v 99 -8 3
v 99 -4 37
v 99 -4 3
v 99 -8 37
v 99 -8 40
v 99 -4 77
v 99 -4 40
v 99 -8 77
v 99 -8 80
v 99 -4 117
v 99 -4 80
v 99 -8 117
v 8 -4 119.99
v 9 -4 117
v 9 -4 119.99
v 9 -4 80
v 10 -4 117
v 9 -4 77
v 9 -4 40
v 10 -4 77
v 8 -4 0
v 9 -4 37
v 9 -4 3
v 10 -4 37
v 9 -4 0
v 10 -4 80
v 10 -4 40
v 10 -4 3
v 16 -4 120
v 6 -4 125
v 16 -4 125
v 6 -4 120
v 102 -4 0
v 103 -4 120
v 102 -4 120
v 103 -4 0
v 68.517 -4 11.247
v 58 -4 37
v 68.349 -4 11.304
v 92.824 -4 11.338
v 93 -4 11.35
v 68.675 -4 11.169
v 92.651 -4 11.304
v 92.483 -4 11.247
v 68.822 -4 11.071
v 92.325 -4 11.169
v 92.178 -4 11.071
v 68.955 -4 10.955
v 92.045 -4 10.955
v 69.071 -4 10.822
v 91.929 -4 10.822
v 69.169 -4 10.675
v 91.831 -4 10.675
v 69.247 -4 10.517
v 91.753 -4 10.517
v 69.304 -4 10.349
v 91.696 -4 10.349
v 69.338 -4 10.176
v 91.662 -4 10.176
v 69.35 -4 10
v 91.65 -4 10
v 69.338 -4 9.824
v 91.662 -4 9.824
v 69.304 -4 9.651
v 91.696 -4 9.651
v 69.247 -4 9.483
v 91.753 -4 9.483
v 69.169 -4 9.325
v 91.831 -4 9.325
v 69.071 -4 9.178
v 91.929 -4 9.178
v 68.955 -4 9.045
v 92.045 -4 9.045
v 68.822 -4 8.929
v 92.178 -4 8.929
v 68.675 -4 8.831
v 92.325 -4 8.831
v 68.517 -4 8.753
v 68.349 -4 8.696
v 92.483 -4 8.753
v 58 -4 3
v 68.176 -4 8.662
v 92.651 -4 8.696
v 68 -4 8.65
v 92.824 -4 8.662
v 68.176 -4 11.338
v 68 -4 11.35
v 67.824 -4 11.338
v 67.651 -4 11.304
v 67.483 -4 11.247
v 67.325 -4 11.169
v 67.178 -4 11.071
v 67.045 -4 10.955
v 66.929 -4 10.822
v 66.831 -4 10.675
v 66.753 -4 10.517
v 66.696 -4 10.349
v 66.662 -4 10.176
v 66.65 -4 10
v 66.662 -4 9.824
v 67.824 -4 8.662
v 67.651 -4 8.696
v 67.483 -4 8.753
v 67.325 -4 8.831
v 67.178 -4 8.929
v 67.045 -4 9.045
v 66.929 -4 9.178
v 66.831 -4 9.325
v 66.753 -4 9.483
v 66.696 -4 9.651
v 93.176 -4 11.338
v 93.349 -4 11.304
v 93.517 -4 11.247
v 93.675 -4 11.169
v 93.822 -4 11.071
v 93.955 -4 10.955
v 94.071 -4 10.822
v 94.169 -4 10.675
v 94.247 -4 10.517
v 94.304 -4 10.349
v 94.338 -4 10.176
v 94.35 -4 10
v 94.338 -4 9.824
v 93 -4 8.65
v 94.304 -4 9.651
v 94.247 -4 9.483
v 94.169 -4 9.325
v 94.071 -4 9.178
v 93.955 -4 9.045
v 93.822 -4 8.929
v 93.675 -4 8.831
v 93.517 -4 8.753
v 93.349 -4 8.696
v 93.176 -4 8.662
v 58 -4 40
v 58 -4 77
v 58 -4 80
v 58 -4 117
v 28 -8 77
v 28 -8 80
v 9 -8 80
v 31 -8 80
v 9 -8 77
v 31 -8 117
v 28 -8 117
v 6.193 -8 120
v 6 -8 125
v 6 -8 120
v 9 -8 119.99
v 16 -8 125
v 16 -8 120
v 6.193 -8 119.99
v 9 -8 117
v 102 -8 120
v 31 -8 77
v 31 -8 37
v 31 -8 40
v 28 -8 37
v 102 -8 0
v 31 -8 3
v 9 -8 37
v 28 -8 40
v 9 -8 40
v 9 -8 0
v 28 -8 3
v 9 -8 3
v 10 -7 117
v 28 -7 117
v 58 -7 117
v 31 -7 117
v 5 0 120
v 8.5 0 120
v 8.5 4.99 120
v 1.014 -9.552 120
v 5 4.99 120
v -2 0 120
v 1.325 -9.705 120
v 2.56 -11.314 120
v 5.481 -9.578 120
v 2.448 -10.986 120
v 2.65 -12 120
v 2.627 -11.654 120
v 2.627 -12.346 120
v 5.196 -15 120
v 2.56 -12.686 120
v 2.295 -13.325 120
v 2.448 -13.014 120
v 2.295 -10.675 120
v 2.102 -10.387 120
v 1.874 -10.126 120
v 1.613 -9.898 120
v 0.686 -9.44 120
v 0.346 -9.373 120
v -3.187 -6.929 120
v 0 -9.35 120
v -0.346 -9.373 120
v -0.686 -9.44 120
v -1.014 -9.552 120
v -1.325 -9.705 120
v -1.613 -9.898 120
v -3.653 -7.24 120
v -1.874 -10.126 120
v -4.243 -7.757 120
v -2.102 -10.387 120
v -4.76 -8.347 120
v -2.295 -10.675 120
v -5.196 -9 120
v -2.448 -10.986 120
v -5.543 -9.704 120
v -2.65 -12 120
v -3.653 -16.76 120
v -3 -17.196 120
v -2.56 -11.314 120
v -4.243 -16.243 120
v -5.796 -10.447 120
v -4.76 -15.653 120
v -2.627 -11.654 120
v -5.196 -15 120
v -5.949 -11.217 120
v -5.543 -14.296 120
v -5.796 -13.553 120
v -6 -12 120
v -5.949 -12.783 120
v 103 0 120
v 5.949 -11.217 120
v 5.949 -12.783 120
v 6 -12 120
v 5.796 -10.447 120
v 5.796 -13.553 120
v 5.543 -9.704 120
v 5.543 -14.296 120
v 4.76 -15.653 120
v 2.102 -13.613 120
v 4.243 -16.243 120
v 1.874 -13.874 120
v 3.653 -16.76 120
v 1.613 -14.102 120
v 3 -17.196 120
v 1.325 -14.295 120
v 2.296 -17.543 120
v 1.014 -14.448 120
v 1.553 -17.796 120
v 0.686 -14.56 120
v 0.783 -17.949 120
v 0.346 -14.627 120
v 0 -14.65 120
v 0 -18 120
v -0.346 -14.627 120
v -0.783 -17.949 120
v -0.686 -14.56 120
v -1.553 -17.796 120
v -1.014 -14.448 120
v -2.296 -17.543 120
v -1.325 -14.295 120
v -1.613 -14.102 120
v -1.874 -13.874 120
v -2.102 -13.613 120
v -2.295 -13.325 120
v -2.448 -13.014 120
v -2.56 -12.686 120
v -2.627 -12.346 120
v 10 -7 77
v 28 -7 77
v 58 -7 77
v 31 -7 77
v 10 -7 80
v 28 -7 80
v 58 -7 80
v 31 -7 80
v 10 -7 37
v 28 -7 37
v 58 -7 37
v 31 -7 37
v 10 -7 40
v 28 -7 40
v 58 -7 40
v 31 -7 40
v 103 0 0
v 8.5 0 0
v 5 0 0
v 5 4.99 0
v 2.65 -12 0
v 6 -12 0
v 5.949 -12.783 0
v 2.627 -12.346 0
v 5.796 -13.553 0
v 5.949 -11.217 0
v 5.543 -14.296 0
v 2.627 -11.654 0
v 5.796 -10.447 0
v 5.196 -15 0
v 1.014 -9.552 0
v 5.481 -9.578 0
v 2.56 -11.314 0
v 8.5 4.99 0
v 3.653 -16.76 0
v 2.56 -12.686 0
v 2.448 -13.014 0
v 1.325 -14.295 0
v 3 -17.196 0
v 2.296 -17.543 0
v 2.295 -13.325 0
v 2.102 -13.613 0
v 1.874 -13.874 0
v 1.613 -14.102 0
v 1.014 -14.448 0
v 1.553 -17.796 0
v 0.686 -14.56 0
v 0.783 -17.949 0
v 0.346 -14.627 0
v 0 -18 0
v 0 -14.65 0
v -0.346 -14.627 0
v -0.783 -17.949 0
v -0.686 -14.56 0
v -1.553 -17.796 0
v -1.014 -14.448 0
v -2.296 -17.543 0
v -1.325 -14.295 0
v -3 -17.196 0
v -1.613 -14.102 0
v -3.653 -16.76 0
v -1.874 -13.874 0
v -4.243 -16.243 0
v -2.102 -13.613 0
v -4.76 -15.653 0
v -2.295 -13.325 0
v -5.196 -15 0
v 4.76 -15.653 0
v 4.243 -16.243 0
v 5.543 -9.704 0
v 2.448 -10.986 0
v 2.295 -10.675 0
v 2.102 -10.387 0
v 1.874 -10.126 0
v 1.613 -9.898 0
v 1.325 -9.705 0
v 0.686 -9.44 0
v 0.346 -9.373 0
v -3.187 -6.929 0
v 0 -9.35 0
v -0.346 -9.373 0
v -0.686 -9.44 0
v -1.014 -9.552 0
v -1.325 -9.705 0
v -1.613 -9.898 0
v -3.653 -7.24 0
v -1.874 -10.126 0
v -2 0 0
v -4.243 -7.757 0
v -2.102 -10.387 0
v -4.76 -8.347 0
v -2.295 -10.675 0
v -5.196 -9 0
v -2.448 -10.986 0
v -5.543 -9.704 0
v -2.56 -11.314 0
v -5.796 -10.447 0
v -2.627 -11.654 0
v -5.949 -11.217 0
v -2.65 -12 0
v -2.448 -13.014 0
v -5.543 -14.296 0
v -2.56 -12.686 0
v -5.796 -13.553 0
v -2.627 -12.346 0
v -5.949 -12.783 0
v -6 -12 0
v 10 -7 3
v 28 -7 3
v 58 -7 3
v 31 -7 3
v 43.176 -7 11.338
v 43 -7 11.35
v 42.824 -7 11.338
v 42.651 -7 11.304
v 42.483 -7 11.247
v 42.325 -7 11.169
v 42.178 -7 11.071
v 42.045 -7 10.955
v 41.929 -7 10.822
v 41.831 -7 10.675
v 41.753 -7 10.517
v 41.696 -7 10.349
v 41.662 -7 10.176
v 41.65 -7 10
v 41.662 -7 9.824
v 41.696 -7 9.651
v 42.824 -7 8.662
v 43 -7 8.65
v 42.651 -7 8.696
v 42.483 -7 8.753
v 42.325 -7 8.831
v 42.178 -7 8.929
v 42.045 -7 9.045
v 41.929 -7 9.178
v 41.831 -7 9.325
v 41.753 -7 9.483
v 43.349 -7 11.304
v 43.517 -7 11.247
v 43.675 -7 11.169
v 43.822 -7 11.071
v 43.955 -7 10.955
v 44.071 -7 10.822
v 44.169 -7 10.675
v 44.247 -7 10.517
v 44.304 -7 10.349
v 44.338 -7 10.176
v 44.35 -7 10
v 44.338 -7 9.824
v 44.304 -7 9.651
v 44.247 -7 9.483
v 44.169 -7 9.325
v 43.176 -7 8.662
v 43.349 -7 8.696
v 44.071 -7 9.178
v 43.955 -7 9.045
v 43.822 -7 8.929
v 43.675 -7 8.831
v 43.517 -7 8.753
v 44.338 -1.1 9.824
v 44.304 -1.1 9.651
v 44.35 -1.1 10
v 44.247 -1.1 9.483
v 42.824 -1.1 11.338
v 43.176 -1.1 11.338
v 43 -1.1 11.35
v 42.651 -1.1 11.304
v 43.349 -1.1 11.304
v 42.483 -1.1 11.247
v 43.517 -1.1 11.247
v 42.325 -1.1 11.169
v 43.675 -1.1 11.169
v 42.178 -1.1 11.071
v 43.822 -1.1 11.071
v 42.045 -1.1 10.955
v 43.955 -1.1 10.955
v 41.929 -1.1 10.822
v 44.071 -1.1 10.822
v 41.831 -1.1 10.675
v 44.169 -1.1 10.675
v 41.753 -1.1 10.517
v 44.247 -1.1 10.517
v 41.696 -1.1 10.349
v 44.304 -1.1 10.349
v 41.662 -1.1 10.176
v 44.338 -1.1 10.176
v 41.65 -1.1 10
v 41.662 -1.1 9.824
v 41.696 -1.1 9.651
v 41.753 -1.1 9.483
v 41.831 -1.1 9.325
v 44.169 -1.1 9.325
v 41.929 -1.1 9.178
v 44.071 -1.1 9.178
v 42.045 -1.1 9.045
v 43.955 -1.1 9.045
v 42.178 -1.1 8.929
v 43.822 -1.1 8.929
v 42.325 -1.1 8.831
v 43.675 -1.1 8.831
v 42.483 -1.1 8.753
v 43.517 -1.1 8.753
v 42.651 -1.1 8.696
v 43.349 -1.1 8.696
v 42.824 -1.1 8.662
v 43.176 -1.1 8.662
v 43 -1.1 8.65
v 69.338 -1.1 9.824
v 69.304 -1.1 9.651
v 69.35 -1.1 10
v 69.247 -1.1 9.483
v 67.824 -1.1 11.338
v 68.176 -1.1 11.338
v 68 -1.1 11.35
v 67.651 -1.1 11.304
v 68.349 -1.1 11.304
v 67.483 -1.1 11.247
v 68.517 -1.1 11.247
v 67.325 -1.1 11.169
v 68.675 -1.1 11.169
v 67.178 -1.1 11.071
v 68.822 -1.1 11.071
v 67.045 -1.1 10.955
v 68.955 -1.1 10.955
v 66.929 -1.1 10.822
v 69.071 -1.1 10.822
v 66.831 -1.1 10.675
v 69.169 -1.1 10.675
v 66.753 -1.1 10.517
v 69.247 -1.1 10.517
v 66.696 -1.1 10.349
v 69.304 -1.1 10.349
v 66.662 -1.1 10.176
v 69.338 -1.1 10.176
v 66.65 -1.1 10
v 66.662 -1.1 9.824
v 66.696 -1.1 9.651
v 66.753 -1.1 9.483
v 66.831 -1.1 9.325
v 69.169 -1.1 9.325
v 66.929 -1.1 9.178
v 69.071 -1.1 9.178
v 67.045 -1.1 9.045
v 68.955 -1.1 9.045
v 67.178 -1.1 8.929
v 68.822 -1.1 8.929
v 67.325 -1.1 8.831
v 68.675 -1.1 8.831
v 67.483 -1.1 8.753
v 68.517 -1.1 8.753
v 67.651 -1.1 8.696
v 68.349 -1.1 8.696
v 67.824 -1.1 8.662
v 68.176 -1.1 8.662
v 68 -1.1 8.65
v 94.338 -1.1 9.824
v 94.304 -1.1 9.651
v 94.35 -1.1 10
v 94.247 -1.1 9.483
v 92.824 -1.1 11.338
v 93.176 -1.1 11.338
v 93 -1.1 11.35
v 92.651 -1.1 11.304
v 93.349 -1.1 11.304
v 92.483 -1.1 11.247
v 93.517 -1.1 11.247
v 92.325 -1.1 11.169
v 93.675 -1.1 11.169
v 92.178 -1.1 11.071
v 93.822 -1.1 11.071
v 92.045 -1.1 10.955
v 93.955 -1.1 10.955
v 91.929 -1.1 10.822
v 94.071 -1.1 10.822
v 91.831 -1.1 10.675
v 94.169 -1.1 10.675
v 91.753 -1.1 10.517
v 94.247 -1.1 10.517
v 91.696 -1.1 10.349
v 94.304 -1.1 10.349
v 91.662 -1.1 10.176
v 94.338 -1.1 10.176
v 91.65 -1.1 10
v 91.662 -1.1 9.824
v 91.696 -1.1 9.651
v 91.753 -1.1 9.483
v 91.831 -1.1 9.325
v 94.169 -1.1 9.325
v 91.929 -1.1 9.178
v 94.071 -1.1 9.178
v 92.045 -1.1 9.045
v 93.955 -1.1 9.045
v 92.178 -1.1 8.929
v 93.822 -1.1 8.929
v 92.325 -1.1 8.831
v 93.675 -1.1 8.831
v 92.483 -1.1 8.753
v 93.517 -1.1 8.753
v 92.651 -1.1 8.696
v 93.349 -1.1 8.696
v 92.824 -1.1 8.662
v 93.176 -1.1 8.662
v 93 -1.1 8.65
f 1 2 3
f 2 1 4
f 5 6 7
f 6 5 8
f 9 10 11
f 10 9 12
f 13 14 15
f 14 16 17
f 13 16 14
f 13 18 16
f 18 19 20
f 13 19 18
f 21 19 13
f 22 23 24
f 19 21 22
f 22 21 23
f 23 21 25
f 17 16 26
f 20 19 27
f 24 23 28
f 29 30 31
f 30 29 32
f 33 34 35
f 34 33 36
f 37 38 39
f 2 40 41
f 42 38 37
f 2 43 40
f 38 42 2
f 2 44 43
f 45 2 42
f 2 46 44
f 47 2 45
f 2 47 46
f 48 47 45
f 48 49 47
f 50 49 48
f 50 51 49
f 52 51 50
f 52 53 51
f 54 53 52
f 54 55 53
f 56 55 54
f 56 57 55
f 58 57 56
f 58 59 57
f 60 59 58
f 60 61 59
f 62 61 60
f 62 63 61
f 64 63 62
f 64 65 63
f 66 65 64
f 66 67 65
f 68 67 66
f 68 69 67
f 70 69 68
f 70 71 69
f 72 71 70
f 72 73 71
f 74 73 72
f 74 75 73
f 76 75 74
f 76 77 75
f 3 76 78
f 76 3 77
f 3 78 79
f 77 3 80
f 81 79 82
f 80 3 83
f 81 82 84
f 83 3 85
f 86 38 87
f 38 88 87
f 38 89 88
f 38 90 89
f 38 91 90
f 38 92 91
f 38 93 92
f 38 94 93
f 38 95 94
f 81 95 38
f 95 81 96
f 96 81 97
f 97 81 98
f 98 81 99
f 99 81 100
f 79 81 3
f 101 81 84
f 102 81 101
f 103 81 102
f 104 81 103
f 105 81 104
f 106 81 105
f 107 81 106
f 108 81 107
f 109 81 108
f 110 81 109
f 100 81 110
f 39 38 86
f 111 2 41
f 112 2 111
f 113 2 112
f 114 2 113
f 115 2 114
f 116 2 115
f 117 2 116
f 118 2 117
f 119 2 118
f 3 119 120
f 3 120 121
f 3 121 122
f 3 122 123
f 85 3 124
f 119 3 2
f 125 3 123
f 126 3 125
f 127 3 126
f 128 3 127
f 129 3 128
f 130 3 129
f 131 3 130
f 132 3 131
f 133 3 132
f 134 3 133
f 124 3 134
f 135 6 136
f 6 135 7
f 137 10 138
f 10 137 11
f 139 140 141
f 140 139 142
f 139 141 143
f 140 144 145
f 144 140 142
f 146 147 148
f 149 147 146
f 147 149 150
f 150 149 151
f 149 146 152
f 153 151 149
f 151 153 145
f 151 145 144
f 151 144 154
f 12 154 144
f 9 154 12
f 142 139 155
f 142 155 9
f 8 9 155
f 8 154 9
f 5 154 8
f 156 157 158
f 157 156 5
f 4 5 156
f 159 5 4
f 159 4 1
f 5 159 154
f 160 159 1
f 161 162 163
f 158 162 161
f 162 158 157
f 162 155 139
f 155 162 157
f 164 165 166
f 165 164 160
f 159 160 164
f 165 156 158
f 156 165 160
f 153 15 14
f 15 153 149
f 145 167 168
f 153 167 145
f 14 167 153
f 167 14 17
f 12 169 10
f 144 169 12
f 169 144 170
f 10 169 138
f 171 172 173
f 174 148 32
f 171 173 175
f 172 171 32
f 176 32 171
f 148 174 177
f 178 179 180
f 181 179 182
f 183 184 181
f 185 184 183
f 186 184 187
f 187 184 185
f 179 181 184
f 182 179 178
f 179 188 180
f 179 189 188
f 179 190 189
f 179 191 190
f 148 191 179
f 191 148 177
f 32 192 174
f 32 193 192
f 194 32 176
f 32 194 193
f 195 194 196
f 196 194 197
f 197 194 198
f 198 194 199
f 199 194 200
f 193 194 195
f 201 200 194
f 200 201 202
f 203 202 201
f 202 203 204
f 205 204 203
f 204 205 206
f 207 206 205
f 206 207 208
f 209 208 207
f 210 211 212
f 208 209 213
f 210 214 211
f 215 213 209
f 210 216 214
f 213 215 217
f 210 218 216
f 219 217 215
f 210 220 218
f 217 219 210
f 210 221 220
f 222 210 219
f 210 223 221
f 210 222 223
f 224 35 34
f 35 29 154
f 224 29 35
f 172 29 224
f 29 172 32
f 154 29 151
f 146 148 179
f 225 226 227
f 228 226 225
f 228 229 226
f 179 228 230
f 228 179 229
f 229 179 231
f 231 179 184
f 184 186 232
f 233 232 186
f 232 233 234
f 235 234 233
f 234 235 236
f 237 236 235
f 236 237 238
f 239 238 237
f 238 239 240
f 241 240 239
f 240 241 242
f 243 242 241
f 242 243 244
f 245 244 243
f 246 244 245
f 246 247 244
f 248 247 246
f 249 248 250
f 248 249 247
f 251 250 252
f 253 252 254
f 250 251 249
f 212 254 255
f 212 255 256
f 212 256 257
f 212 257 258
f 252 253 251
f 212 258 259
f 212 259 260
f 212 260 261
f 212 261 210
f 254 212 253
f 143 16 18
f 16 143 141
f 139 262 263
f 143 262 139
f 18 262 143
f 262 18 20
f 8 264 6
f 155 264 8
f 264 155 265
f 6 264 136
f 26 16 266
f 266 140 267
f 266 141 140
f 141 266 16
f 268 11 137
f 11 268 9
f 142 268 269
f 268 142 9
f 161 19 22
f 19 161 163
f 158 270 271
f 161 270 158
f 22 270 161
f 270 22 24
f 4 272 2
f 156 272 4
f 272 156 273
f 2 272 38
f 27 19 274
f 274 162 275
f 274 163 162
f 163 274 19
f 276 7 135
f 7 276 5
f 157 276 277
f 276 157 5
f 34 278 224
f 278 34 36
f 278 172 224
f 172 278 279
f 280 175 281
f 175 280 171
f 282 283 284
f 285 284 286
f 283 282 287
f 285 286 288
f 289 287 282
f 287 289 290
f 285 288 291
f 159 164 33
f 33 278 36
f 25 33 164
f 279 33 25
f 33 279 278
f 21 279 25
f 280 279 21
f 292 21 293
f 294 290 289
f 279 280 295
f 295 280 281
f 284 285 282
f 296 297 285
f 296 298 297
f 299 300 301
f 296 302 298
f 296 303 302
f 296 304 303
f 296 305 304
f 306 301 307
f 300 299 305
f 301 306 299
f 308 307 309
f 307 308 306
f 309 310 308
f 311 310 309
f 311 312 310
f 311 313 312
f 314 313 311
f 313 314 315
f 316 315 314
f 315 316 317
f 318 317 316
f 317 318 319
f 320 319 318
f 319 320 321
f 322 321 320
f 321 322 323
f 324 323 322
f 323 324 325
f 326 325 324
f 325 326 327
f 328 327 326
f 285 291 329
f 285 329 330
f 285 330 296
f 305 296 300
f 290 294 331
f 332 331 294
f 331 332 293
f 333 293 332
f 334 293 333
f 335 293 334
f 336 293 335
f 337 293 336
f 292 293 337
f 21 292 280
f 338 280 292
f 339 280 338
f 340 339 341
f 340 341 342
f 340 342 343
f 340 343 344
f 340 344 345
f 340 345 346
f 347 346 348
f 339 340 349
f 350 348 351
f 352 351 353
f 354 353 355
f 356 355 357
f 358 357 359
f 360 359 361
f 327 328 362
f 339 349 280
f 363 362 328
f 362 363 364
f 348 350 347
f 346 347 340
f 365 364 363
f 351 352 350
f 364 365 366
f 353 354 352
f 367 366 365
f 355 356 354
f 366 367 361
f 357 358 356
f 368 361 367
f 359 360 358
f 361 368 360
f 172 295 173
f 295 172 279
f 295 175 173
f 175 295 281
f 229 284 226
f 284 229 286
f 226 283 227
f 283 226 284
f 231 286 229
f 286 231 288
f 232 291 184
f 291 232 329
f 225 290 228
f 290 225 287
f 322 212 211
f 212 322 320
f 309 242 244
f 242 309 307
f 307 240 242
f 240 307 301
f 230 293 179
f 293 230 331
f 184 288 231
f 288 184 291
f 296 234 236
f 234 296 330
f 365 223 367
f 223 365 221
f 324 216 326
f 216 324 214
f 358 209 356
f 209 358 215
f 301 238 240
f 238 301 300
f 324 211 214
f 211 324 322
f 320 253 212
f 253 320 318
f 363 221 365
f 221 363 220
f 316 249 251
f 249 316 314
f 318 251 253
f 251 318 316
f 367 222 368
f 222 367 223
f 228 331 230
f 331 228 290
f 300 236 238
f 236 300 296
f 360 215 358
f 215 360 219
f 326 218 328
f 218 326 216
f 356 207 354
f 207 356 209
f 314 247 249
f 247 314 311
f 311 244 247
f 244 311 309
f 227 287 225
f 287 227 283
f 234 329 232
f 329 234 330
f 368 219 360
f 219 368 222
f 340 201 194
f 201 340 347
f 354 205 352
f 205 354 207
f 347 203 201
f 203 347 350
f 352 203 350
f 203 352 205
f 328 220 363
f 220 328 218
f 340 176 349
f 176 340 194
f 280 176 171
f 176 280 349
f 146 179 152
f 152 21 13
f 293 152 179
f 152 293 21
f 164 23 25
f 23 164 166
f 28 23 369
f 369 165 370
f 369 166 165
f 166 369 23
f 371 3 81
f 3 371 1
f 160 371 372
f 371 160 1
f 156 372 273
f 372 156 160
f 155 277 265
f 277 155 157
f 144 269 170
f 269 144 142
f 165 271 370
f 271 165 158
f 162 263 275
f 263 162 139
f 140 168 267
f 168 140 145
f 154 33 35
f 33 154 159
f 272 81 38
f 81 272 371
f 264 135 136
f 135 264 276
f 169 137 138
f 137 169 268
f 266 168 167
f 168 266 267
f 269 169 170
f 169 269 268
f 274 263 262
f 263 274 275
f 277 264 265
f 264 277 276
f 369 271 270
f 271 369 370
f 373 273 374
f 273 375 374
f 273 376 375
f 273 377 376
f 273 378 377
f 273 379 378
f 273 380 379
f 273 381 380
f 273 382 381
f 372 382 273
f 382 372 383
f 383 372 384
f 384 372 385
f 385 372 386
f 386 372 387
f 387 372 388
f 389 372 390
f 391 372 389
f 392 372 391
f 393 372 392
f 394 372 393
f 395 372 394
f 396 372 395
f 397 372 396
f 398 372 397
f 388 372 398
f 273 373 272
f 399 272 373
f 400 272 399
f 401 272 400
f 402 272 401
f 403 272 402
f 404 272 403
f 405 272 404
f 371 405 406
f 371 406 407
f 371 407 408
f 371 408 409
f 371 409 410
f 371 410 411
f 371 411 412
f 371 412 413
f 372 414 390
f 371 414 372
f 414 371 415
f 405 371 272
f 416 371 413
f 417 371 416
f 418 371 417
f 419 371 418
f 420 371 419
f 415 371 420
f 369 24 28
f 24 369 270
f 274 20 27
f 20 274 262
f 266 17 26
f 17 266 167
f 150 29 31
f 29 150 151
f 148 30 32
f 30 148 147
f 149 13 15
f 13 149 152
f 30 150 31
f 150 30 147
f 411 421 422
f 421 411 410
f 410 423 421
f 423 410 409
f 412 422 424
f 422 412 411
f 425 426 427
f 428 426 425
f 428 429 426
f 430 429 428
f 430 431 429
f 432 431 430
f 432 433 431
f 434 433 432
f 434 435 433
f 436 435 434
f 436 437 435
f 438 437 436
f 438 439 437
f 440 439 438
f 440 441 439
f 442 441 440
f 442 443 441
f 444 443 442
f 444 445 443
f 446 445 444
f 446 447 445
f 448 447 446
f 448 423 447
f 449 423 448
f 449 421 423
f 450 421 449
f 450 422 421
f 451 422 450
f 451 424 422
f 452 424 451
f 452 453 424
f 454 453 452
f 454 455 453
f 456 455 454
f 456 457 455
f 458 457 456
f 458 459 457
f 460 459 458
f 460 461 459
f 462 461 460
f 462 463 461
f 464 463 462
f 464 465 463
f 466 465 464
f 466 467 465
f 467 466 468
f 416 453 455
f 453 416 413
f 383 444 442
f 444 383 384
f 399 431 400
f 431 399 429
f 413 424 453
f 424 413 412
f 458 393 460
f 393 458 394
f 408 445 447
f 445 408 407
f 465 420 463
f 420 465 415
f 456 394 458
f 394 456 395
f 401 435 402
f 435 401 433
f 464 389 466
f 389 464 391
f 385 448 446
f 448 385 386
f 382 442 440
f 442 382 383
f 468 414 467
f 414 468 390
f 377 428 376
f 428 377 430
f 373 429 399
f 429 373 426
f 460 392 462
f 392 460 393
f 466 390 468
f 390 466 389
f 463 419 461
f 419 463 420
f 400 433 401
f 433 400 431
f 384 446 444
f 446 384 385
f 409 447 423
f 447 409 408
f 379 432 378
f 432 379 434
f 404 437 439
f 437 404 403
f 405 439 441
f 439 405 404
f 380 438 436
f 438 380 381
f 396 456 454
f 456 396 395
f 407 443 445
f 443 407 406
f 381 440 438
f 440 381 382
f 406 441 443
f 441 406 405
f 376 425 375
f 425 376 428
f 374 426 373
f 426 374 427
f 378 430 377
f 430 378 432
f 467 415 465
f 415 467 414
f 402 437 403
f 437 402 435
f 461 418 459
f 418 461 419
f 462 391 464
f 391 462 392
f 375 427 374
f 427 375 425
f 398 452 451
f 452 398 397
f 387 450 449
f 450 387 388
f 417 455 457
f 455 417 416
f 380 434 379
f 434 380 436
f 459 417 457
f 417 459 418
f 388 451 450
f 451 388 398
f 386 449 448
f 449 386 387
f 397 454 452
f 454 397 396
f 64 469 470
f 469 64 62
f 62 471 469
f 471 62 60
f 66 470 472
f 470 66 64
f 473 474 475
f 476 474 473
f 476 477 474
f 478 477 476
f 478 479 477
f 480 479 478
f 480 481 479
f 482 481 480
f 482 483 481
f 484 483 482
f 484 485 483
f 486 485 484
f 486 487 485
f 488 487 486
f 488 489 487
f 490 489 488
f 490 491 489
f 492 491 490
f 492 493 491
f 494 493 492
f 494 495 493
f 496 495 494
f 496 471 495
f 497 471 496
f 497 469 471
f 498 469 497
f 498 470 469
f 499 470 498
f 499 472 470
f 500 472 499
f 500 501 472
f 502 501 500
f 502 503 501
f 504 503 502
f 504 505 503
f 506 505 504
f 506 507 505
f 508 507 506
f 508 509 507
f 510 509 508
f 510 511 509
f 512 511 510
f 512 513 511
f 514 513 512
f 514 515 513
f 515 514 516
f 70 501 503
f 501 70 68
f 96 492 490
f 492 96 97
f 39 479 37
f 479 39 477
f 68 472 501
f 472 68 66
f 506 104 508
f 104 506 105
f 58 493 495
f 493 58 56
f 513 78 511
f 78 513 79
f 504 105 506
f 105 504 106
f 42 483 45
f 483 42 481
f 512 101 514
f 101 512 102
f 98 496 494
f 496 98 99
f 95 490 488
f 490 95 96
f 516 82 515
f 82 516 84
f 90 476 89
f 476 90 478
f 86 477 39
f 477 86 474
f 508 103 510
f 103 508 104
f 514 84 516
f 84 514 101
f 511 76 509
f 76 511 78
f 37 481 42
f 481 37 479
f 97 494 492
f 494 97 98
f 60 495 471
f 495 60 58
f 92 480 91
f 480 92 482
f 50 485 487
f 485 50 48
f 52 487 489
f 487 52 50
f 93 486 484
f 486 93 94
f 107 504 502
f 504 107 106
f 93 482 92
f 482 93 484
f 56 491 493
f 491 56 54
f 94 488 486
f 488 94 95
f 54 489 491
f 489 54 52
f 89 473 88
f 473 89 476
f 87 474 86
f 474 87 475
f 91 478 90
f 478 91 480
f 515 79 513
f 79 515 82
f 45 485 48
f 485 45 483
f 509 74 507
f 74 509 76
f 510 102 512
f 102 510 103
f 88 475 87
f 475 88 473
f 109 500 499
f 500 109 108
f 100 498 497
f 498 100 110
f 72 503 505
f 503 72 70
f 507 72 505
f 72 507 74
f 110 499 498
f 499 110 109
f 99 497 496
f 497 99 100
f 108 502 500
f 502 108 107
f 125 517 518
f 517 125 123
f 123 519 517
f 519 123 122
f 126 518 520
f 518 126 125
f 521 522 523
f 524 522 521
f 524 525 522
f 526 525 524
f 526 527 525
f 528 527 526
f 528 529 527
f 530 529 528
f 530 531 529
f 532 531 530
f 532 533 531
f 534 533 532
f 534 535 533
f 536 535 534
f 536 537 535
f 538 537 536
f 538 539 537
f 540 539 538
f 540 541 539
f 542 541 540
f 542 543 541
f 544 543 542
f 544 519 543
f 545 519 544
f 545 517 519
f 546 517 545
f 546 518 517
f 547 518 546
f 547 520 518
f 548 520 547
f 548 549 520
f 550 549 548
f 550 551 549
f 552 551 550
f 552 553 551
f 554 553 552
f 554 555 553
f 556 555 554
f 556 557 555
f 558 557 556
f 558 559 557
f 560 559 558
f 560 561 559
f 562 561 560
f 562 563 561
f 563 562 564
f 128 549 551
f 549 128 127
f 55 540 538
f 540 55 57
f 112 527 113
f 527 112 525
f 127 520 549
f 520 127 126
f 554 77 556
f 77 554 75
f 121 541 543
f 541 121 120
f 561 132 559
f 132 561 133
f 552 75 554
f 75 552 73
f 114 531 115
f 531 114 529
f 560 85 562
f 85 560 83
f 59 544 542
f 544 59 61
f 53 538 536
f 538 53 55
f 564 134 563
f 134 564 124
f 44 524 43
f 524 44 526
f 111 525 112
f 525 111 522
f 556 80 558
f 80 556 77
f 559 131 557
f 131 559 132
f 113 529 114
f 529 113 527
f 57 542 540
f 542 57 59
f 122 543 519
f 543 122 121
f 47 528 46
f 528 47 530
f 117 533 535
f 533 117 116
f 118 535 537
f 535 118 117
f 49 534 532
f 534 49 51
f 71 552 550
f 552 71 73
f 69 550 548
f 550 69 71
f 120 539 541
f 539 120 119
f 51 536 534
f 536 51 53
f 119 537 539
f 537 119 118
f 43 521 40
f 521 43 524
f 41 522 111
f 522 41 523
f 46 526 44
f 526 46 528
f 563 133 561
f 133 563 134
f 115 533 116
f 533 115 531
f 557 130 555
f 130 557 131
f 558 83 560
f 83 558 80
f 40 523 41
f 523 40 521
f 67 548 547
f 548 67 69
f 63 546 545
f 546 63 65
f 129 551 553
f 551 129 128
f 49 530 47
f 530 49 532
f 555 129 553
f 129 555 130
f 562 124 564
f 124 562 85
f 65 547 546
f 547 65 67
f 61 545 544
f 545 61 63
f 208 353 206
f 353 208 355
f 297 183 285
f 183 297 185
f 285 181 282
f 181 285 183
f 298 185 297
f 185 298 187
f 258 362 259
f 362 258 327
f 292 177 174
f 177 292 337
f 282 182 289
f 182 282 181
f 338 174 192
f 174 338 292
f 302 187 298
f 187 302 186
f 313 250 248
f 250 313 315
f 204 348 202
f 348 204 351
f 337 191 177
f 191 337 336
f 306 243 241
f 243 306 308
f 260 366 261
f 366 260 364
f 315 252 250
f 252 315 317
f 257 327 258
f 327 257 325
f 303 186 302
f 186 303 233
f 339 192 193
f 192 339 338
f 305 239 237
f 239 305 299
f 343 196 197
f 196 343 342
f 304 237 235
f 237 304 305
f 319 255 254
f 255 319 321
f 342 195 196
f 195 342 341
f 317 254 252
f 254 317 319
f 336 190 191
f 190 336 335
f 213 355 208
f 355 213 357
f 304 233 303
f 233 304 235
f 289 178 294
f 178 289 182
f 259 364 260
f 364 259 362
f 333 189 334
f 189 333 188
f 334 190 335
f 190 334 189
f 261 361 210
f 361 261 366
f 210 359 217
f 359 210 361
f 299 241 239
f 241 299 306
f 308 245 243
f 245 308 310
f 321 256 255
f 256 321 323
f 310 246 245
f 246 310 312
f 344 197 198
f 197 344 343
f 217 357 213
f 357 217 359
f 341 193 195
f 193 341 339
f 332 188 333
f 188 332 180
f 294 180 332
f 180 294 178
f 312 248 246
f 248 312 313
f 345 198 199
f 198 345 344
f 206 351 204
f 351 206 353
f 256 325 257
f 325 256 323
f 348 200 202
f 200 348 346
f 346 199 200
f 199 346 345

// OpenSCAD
// file: lib/comun.scad
// =====================================================================
// AutoSwapEnder3Pro - parametros y utilidades comunes de las piezas
// Licencia MIT. Unidades: milimetros.
//
// Sistema de coordenadas de la ESTACION (el mismo en todas las piezas que
// se montan en ella):
//   s : a lo largo de la estacion, 0 = HOME del carro, crece hacia la impresora
//   x : a lo ancho, 0 = eje central (riel lineal), +x = lado de la caja de descarga
//   z : vertical, 0 = cara superior de la base de perfiles 2020 ("b" en la guia)
// El plano de transferencia (superficie por la que se deslizan las placas)
// esta en z = PLANO. Se ajusta a la altura de la cama de la impresora con las
// patas niveladoras, NO cambiando estas piezas.
// =====================================================================

$fn = 48;

// ----------------------------------------------------- placas y cama
placa_ancho  = 235;     // placa PEI
placa_largo  = 235;
placa_esp    = 0.6;     // espesor real de tus placas (mide con calibrador; 0.5 a 0.75)
voladizo     = 11;      // cuanto sobresale la placa (o su lengüeta) por delante de la cama

// ----------------------------------------------------- estacion (alturas sobre la base)
PLANO        = 60;      // plano de transferencia sobre la cara superior de la base
RIEL_SUP     = 20;      // cara superior del riel lineal (2020 apoyado en los travesaños)
ZP           = PLANO - RIEL_SUP;  // = 40: plano de transferencia sobre el riel lineal

// zapata (debe coincidir con zapata.scad)
zapata_bajo  = 8;       // cuanto cuelga la zapata por debajo de la placa
zapata_bolsillo = 6;    // profundidad del bolsillo para el dedo (desde abajo)

// cargador (ascensor)
paso_estante = 14;      // distancia vertical entre placas en el cargador
niveles      = 6;       // placas que caben en el cargador

// ----------------------------------------------------- perfil y tornilleria
perfil      = 20;       // perfil de aluminio 2020
ranura_ancho = 6.2;     // boca de la ranura (serie 20)
holgura     = 0.3;      // holgura general de impresion

m2_paso     = 1.8;   // agujero para autorroscante M2 (servos)
m3          = 3.4;   // paso libre M3
m3_rosca    = 2.7;   // para roscar M3 directamente en plastico
m3_tuerca   = 5.7;   // M3: entre caras + holgura
m3_tuerca_h = 2.6;
m3_cabeza   = 6.2;
m4          = 4.4;
m5          = 5.4;   // paso libre M5
m5_cabeza   = 9.2;
m5_tuerca   = 8.2;   // M5: entre caras + holgura

// ruedas en V estandar (Openbuilds "Solid V Wheel" + rodamientos 625)
rueda_d      = 23.9;
rueda_ancho  = 10.2;
rueda_sep    = 39.26;   // distancia entre centros de ruedas a ambos lados de un 2020
excentrica_d = 7.2;     // alojamiento del espaciador excentrico
espaciador_h = 6;       // espaciador (excentrico o fijo) entre rueda y placa

// ----------------------------------------------------- utilidades

// Caja con aristas verticales redondeadas (r) apoyada en z=0.
module caja_r(size, r = 2) {
  r2 = min(r, size[0] / 2 - 0.01, size[1] / 2 - 0.01);
  hull() for (ix = [r2, size[0] - r2], iy = [r2, size[1] - r2])
    translate([ix, iy, 0]) cylinder(r = r2, h = size[2]);
}

// Igual pero centrada en x e y.
module caja_rc(size, r = 2) { translate([-size[0] / 2, -size[1] / 2, 0]) caja_r(size, r); }

// Prisma hexagonal para tuercas (ec = medida entre caras).
module hexagono(ec, h) { cylinder(d = ec / cos(30), h = h, $fn = 6); }

// Ranura (agujero alargado) a lo largo de x.
module ranura(largo, d, h) {
  hull() for (i = [-largo / 2, largo / 2]) translate([i, 0, 0]) cylinder(d = d, h = h);
}

// Taladro M5 con avellanado para la cabeza (para atornillar a un perfil con tuerca en T).
module taladro_m5(h, cabeza = 4) {
  translate([0, 0, -0.1]) cylinder(d = m5, h = h + 0.2);
  translate([0, 0, h - cabeza]) cylinder(d = m5_cabeza + 0.6, h = cabeza + 0.1);
}

// Taladro M3 pasante con alojamiento de tuerca hexagonal por debajo.
module taladro_m3_tuerca(h, prof_tuerca = m3_tuerca_h + 0.2) {
  translate([0, 0, -0.1]) cylinder(d = m3, h = h + 0.2);
  translate([0, 0, -0.1]) hexagono(m3_tuerca, prof_tuerca + 0.1);
}

// Perfil 2020 de referencia (solo para ensamble y comprobaciones visuales).
module perfil2020(largo) {
  difference() {
    translate([-10, -10, 0]) cube([20, 20, largo]);
    for (a = [0, 90, 180, 270]) rotate([0, 0, a])
      translate([10 - 1.8, -ranura_ancho / 2, -1]) cube([2, ranura_ancho, largo + 2]);
    translate([0, 0, -1]) cylinder(d = 4.2, h = largo + 2);
  }
}

// Microinterruptor KW11-3Z con palanca de rodillo (referencia: 20 x 6.4 x 10 mm,
// taladros M2 a 9.5 mm). Agujeros de montaje, con la cara de montaje en z=0.
module taladros_kw11(h = 10) {
  for (i = [-4.75, 4.75]) translate([i, 0, -0.1]) cylinder(d = 2.2, h = h + 0.2);
}
// main file
// =====================================================================
// VOLTEADOR - tapa basculante del lado izquierdo de la zona de descarga
// Material: PETG. 3 perimetros, 25 %. Imprimir las 2 mitades + la union.
//   pieza = "mitad1" (s 280-400, lado HOME) | "mitad2" (s 400-520) | "union"
//
// Funcionamiento: la placa usada queda apoyada en el volteador (izquierda) y en
// la tapa del riel derecho. El servo MG996R (volteador_servo.scad) empuja el
// volteador hacia arriba girando sobre su bisagra (x = -128): el borde izquierdo
// de la placa sube, la placa pivota sobre la ceja del riel derecho y resbala a
// la caja. Pega cinta de PTFE en la superficie superior.
// Coordenadas = las de la estacion (x, s, z); eje de la bisagra en x = -128,
// z = PLANO - 12. Superficie superior en z = PLANO.
// =====================================================================
include <lib/comun.scad>

pieza = "mitad1";

eje = [-128, PLANO - 12];
x_int = -25;           // borde interior (canal central libre para el carro)
x_ext = -123;
grueso = 4;
s_ini = 280; s_mitad = 400; s_fin = 520;
pared_guia = [-123, -119.5, 5];   // la placa (x >= -117.5) queda a 2 mm
tubo = [12, 5.3];

module mitad(s0, s1, oreja0, oreja1) {
  largo = s1 - s0;
  difference() {
    union() {
      // superficie
      translate([x_ext, s0, PLANO - grueso]) cube([x_int - x_ext, largo, grueso]);
      // pared guia
      translate([pared_guia[0], s0, PLANO - 0.01]) cube([pared_guia[1] - pared_guia[0], largo, pared_guia[2]]);
      // tubo de la bisagra + alma
      translate([eje[0], s0, eje[1]]) rotate([-90, 0, 0]) cylinder(d = tubo[0], h = largo);
      hull() {
        translate([eje[0], s0, eje[1]]) rotate([-90, 0, 0]) cylinder(d = 8, h = largo);
        translate([eje[0] - 2, s0, PLANO - grueso]) cube([10, largo, grueso]);
      }
      // nervios inferiores (cada 40 mm) y nervio longitudinal
      for (s = [s0 : 40 : s1 - 1]) translate([x_ext + 4, s, PLANO - grueso - 4]) cube([x_int - x_ext - 8, 3, 4]);
      translate([x_ext + 4, s1 - 3, PLANO - grueso - 4]) cube([x_int - x_ext - 8, 3, 4]);
      translate([-100, s0, PLANO - grueso - 4]) cube([3, largo, 4]);
      translate([x_int - 4, s0, PLANO - grueso - 4]) cube([3, largo, 4]);
      // pista de contacto de la palanca del servo (el rodillo rueda aqui)
      translate([-118, s0, PLANO - grueso - 3]) cube([48, largo, 3]);
      // orejas de tope (apoyan en la repisa de los pedestales con el volteador cerrado)
      if (oreja0) translate([-122, s0 - 5, PLANO - 8]) cube([10, 5.01, 4]);
      if (oreja1) translate([-122, s1 - 0.01, PLANO - 8]) cube([10, 5.01, 4]);
    }
    translate([eje[0], s0 - 1, eje[1]]) rotate([-90, 0, 0]) cylinder(d = tubo[1], h = largo + 2);
    // agujeros para la union (M3 autorroscante)
    for (dx = [-85, -60, -35]) translate([dx, s0 == s_ini ? s1 - 10 : s0 + 10, PLANO - grueso - 4.1])
      cylinder(d = m3_rosca, h = grueso + 3);
  }
}

module union_mitades() {
  difference() {
    translate([-92, s_mitad - 18, PLANO - grueso - 7]) caja_r([66, 36, 3], 3);
    for (dx = [-85, -60, -35], ds = [-10, 10]) translate([dx, s_mitad + ds, PLANO - 20]) cylinder(d = m3, h = 30);
  }
}

// Orientacion de impresion: de pie sobre el extremo SIN oreja (tubo y superficie
// verticales, nervios con voladizo de 4 mm). Usa borde de adherencia (brim).
if (pieza == "mitad1") translate([0, 0, s_mitad]) rotate([-90, 0, 0]) translate([128, 0, -PLANO]) mitad(s_ini, s_mitad, true, false);
else if (pieza == "mitad2") translate([0, 0, -s_mitad]) rotate([90, 0, 0]) translate([128, 0, -PLANO]) mitad(s_mitad, s_fin, false, true);
else translate([0, -s_mitad, -(PLANO - grueso - 7)]) union_mitades();
